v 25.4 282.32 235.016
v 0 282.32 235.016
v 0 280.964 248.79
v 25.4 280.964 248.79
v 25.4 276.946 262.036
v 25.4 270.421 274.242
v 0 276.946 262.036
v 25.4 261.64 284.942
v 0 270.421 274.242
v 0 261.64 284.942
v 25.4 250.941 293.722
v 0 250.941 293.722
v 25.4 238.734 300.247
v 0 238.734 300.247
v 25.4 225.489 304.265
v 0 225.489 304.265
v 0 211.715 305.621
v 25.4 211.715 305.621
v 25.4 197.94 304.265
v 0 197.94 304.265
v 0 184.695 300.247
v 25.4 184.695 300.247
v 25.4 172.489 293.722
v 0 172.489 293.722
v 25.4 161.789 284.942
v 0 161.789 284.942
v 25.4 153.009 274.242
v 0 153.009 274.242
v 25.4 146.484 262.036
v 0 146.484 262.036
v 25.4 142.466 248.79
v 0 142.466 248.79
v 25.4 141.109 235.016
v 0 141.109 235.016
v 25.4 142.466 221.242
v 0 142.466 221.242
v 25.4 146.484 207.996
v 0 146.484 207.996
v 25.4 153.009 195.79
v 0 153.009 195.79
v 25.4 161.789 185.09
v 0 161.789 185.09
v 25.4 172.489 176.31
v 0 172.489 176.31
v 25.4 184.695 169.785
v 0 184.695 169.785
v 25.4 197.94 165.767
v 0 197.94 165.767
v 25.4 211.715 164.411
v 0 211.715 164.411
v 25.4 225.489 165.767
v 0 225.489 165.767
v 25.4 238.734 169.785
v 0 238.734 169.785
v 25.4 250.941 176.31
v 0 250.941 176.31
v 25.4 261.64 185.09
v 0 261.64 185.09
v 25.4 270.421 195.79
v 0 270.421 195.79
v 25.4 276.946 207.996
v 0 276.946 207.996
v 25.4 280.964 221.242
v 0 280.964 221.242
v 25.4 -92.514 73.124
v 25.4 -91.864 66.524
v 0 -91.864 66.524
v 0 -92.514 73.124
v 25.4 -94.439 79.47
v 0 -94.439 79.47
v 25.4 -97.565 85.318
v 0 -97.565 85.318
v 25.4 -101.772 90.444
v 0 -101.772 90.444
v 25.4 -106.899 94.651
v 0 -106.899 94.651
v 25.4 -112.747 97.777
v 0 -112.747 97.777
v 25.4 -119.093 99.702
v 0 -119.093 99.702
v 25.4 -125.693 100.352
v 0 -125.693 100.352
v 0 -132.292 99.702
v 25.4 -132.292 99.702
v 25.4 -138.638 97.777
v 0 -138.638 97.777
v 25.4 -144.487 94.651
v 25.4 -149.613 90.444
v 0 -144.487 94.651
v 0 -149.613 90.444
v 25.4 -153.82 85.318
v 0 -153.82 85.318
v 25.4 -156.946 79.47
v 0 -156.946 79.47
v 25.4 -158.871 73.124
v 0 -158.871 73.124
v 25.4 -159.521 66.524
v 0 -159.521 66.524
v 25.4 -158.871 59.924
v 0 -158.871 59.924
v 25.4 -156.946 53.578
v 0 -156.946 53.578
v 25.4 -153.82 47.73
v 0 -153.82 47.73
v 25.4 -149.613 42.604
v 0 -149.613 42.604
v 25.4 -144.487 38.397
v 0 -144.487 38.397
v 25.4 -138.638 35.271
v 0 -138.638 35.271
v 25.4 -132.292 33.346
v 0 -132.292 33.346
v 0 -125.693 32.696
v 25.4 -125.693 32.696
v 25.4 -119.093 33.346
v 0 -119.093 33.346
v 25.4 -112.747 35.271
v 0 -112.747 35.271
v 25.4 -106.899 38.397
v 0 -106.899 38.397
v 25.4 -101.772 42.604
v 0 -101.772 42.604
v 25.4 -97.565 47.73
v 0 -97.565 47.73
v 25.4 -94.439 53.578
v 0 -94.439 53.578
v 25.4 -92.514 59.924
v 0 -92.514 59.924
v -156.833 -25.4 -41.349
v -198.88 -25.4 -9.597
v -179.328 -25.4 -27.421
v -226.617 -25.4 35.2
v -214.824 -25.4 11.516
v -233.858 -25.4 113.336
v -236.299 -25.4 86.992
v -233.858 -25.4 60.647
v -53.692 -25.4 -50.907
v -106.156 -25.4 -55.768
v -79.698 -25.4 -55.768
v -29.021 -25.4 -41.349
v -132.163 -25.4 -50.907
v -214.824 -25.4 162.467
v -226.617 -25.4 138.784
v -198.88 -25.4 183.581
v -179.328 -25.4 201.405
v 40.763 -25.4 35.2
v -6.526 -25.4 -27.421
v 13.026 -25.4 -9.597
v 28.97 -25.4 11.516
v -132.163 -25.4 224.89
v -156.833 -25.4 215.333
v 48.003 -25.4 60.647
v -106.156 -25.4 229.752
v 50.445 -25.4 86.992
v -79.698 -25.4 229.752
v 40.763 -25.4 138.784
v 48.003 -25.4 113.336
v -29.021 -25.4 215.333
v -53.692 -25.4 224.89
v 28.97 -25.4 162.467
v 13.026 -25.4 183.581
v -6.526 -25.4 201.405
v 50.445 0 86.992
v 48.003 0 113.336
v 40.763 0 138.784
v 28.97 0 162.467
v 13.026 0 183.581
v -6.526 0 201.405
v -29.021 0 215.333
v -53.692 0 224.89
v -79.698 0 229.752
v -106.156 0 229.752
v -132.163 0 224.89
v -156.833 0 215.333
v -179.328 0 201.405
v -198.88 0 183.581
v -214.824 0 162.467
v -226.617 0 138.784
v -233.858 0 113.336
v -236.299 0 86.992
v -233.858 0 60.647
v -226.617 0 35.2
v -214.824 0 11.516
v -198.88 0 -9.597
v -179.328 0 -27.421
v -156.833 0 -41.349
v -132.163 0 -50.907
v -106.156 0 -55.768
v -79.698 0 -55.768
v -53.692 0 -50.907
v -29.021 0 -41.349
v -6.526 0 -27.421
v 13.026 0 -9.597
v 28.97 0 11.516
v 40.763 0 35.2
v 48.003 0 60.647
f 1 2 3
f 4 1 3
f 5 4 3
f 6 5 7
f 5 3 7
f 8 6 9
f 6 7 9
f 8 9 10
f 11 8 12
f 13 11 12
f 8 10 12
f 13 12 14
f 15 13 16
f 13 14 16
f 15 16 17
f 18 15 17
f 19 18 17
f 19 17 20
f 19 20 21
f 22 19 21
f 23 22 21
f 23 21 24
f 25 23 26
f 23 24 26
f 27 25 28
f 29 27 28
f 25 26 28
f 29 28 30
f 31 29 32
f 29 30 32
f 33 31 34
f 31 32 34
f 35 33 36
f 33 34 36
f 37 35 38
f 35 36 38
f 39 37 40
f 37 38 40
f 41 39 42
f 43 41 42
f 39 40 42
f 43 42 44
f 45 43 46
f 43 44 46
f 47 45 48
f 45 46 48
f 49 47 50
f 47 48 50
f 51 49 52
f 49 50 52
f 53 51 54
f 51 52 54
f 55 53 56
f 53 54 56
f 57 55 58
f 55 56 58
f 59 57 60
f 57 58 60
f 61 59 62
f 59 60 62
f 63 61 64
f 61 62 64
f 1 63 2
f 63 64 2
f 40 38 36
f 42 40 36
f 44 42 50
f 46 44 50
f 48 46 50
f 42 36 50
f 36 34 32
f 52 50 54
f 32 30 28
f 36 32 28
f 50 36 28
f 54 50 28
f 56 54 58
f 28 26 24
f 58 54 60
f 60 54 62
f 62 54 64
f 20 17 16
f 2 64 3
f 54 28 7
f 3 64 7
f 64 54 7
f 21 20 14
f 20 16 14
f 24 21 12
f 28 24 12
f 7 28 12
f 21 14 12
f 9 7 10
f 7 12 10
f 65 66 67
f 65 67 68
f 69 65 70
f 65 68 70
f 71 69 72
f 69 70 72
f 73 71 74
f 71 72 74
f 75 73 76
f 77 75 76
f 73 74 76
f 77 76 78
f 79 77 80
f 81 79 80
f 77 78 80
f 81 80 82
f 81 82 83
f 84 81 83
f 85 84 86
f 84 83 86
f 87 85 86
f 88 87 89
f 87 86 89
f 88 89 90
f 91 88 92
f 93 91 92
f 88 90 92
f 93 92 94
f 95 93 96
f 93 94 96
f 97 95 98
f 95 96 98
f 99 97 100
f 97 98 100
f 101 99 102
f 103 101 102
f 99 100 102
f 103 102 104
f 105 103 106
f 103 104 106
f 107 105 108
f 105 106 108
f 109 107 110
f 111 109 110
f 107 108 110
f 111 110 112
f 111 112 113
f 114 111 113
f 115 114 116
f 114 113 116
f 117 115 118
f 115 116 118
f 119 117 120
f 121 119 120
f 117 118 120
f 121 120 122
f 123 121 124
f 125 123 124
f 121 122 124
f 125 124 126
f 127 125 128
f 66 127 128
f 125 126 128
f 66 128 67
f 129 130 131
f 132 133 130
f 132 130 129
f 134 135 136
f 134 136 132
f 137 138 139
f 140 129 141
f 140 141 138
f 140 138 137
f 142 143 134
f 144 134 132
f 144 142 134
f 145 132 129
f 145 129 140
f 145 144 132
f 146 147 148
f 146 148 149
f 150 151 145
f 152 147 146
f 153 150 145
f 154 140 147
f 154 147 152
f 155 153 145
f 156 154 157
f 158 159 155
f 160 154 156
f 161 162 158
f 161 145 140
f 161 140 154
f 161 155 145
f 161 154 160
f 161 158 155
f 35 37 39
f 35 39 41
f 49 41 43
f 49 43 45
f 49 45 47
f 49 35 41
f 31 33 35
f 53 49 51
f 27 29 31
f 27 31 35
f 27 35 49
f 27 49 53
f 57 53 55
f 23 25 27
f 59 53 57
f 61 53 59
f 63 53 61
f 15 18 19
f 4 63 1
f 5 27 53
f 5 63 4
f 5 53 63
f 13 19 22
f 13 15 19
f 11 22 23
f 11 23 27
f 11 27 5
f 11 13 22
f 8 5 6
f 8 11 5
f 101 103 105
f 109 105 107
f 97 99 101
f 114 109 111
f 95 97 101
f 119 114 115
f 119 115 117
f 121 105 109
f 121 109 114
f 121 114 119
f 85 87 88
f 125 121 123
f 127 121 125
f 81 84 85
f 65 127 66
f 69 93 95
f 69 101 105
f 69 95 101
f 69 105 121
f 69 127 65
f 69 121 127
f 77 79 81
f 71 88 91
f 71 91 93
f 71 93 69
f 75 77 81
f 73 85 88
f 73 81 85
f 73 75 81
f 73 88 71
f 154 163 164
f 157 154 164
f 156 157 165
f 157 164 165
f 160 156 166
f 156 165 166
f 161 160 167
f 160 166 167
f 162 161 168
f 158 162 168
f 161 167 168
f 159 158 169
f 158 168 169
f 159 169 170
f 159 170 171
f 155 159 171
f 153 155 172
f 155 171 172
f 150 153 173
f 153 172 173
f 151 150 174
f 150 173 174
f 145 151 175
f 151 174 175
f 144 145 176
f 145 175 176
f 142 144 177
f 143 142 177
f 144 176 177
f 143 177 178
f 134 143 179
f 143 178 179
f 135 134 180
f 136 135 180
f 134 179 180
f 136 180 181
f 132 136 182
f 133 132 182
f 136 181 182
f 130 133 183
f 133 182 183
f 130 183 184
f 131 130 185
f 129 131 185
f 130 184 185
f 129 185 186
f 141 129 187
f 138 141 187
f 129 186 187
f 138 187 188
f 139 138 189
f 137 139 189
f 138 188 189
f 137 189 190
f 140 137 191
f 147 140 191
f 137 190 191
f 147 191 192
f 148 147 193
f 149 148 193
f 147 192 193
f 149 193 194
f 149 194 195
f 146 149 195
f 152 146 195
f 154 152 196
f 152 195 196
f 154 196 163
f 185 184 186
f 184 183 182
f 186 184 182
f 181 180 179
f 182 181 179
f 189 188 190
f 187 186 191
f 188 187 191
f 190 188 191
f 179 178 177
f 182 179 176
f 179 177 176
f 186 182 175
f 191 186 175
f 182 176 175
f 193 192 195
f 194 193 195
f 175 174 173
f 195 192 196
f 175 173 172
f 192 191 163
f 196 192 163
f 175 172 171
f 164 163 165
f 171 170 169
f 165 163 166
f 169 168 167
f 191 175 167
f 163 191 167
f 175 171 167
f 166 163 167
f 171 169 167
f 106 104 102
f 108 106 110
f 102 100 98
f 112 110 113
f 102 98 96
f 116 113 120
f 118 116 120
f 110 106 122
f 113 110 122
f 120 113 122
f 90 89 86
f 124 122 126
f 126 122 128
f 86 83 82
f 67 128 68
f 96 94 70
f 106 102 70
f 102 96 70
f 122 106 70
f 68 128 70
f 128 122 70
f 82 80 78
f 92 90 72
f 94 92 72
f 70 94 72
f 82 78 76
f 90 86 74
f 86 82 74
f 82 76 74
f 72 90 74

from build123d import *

# Parameters (mm, degrees)
F0_R     = 33.828381
F1_DEPTH = 25.4
F2_R     = 70.605472
F3_DEPTH = 25.4
F4_R     = 143.371726
F5_DEPTH = 25.4


with BuildPart() as f1:
    # F0 (on Right) → F1 (new body)
    with BuildSketch(Plane.YZ):
        with Locations((-125.692561, 66.523999)):
            Circle(F0_R)
    extrude(amount=F1_DEPTH)


with BuildPart() as f3:
    # F2 (on Right) → F3 (new body)
    with BuildSketch(Plane.YZ):
        with Locations((211.714819, 235.015988)):
            Circle(F2_R)
    extrude(amount=F3_DEPTH)


with BuildPart() as f5:
    # F4 (on Front) → F5 (new body)
    with BuildSketch(Plane.XZ):
        with Locations((-92.927106, 86.991832)):
            Circle(F4_R)
    extrude(amount=F5_DEPTH)


solid = Compound([f1.part, f3.part, f5.part])
